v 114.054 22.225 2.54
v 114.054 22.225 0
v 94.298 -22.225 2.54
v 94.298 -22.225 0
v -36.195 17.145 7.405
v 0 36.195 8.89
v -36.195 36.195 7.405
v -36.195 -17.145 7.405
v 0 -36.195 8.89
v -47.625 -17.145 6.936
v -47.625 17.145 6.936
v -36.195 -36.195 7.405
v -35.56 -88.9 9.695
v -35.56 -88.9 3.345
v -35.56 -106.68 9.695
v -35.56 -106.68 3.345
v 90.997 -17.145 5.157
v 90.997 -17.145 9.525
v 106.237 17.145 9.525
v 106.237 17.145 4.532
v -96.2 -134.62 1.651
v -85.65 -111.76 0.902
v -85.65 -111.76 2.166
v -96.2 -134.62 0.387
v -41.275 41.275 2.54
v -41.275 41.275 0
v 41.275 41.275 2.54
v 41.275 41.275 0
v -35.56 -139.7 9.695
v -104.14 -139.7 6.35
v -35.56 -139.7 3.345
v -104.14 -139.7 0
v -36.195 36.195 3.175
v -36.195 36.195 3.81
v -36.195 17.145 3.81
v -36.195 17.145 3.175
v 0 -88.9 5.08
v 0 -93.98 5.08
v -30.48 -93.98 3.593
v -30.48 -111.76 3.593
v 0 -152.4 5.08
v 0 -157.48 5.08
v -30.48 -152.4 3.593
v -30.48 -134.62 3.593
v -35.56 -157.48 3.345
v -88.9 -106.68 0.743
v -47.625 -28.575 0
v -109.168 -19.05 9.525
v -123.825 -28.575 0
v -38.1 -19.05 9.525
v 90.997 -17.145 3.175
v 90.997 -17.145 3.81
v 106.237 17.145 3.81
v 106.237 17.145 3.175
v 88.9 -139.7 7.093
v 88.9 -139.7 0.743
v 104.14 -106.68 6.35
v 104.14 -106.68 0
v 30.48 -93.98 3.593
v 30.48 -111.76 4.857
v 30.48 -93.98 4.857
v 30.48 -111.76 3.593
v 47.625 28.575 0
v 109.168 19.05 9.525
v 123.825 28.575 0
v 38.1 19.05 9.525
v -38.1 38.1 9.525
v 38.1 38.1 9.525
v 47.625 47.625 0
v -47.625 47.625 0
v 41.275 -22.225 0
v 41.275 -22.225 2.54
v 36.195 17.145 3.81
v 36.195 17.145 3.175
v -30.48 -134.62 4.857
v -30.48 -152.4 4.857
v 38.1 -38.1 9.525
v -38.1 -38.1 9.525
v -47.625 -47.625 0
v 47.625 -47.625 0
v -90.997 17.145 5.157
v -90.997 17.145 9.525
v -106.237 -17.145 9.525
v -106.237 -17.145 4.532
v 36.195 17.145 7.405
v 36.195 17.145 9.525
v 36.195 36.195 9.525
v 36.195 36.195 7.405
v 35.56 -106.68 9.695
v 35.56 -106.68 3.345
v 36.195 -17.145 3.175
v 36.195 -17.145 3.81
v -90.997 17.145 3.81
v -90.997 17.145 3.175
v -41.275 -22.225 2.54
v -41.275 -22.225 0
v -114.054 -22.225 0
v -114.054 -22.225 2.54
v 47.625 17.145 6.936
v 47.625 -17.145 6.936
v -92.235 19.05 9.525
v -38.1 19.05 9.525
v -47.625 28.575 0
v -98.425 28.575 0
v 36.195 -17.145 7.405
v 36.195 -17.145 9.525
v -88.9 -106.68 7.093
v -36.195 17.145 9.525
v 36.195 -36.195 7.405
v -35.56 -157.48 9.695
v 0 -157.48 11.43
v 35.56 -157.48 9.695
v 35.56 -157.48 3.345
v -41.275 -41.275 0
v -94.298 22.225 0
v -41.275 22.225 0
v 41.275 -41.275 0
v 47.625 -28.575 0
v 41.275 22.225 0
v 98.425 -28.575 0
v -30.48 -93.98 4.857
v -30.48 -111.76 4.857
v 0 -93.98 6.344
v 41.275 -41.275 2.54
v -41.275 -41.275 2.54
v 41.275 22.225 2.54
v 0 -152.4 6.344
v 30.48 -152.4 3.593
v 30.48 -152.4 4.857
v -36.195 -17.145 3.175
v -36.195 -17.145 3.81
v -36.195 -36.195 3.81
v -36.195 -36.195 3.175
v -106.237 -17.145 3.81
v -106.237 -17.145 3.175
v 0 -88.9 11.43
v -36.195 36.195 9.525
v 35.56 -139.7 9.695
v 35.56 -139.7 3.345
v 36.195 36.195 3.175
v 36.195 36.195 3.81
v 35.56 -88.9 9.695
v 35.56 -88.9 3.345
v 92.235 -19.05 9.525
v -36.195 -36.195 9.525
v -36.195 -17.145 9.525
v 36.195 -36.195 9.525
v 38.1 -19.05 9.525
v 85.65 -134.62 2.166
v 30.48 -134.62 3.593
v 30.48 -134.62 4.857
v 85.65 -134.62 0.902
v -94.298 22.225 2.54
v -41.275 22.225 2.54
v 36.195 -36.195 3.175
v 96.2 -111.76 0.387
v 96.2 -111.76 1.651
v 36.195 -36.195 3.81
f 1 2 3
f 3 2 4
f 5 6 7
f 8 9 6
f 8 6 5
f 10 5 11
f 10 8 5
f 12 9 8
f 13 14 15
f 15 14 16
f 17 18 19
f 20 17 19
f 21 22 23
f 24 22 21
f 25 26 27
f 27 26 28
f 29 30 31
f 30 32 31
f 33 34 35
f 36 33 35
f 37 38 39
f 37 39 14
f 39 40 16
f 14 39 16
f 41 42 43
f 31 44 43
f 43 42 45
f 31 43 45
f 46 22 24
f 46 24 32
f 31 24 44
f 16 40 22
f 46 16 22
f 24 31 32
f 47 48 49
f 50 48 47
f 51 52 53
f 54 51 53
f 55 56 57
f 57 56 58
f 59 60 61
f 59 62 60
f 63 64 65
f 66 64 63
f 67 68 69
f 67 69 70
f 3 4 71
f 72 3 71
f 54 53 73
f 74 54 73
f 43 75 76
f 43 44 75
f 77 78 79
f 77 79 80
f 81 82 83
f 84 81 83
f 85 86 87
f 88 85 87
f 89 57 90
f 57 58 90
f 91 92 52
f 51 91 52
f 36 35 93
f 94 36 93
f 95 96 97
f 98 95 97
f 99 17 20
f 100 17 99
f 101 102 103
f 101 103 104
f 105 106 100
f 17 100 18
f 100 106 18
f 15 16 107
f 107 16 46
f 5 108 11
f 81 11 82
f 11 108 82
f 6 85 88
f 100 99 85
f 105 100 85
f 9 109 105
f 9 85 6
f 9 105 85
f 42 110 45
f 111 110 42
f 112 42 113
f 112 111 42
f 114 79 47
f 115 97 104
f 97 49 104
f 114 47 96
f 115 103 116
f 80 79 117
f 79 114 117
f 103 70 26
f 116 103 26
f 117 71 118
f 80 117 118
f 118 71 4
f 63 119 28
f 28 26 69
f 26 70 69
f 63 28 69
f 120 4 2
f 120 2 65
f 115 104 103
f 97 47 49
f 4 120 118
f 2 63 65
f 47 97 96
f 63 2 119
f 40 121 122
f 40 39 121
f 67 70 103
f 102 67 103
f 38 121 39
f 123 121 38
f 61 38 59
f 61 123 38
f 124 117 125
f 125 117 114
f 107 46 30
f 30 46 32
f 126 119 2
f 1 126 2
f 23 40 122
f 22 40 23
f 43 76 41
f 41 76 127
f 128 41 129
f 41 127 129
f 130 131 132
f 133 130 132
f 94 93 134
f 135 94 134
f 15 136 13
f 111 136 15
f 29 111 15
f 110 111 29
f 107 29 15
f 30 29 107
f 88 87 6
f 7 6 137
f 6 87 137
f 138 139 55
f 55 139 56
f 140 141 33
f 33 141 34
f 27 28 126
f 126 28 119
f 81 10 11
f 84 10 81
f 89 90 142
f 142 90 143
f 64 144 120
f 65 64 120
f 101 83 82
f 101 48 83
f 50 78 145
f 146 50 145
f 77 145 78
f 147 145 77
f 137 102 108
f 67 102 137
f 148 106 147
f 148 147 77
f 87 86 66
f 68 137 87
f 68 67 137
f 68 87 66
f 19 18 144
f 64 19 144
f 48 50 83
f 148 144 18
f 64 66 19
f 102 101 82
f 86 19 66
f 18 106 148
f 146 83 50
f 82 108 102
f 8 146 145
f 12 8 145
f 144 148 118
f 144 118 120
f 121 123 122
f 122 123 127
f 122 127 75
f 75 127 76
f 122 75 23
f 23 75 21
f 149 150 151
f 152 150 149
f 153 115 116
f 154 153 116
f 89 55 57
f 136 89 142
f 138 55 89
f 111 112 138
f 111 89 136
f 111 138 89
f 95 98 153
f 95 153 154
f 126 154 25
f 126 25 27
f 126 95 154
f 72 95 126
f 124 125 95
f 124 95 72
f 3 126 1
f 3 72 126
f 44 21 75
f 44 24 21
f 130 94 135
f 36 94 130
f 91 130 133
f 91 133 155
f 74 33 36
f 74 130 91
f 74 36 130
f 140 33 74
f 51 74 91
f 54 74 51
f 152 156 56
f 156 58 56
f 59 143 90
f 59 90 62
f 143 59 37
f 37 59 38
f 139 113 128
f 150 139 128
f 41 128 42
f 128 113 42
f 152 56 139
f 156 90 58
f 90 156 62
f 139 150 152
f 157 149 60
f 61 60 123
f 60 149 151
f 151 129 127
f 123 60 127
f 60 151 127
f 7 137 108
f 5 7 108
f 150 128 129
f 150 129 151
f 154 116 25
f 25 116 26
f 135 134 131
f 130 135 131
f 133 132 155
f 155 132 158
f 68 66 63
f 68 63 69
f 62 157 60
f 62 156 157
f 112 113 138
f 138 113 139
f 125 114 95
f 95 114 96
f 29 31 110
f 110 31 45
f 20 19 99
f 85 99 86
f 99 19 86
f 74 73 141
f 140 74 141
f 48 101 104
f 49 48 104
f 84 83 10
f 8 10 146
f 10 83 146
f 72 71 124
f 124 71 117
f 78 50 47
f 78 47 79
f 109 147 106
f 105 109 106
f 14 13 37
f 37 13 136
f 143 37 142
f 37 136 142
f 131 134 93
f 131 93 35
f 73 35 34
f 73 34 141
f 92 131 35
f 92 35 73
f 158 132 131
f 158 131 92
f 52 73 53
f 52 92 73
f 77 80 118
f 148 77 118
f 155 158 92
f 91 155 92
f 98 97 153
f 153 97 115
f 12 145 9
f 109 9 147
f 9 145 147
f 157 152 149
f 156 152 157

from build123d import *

# Parameters (mm, degrees)
F1_DEPTH  = 9.525
F3_DEPTH  = 6.35
F5_DEPTH  = 83.82
F6_DEPTH  = 3.1271538462
F7_SIZE   = 9.52499
F9_DEPTH  = 6.35
F11_DEPTH = 68.58
F12_DEPTH = 3.3463658537
F14_DEPTH = 68.58
F15_T     = -5.08
F17_DEPTH = 2.54


# Not quite as in the source:
# - a fillet or chamfer is up to 0.001 mm smaller than in the source, because OpenCascade refuses the exact size
# - a length typed as a fraction of an inch, garbled in the dataset ("3 / 203.2 mm" for 3/8 in), is restored


with BuildPart() as f1:
    # F0 (on Top) → F1 (new body)
    with BuildSketch(Plane.XY):
        Polygon((-47.625, 28.575), (-98.425, 28.575), (-123.825, -28.575), (-47.625, -28.575), (-47.625, -47.625), (47.625, -47.625), (47.625, -28.575), (98.425, -28.575), (123.825, 28.575), (47.625, 28.575), (47.625, 47.625), (-47.625, 47.625), align=None)
    extrude(amount=F1_DEPTH)

    # F2 (on face) → F3 (cut)
    with BuildSketch(Plane.XY.offset(9.525)):
        Polygon((-36.195, 36.195), (-36.195, 17.145), (-90.9969505917, 17.145), (-106.2369505917, -17.145), (-36.195, -17.145), (-36.195, -36.195), (36.195, -36.195), (36.195, -17.145), (90.9969505917, -17.145), (106.2369505917, 17.145), (36.195, 17.145), (36.195, 36.195), align=None)
    extrude(amount=-F3_DEPTH, mode=Mode.SUBTRACT)

    # F4 (on face) → F5 (join, through all)
    with BuildSketch(Plane.XZ.offset(47.625)):
        Polygon((-47.625, 6.9361538462), (-47.625, 3.81), (47.625, 3.81), (47.625, 6.9361538462), (0, 8.89), align=None)
        Polygon((-47.625, 6.9361538462), (-123.825, 3.81), (-47.625, 3.81), align=None)
        Polygon((47.625, 6.9361538462), (47.625, 3.81), (123.825, 3.81), align=None)
    extrude(amount=-F5_DEPTH)

    # F6 (cut, through all): faces of the model
    f6_faces = [f1.faces().sort_by_distance(p)[0] for p in [
        (-85.725, -38.1, 3.81),
        (85.725, -46.5473692655, 3.81),
        (85.725, 32.385, 3.81),
        (-112.0388843262, 0.4061708117, 3.81),
    ]]
    extrude(f6_faces, amount=-F6_DEPTH, mode=Mode.SUBTRACT)

    # F7 (size 9.525 in the source; OpenCascade refuses exactly that, so slightly less here)
    f7_edges = [f1.edges().sort_by_distance(p)[0] for p in [
        (-111.125, 0, 9.525),
        (-73.025, 28.575, 9.525),
        (0, 47.625, 9.525),
        (-47.625, 38.1, 9.525),
        (47.625, 38.1, 9.525),
        (85.725, 28.575, 9.525),
        (111.125, 0, 9.525),
        (73.025, -28.575, 9.525),
        (47.625, -38.1, 9.525),
        (0, -47.625, 9.525),
        (-47.625, -38.1, 9.525),
        (-85.725, -28.575, 9.525),
    ]]
    chamfer(f7_edges, length=F7_SIZE)

    # F16 (on face) → F17 (cut)
    with BuildSketch(Plane(origin=(0, 0, 0), x_dir=(1, 0, 0), z_dir=(0, 0, -1))):
        Polygon((-41.275, 41.275), (-41.275, 22.225), (-114.0538614398, 22.225), (-94.2983058843, -22.225), (-41.275, -22.225), (-41.275, -41.275), (41.275, -41.275), (41.275, -22.225), (114.0538614398, -22.225), (94.2983058843, 22.225), (41.275, 22.225), (41.275, 41.275), align=None)
    extrude(amount=-F17_DEPTH, mode=Mode.SUBTRACT)


with BuildPart() as f9:
    # F8 (on Top) → F9 (new body)
    with BuildSketch(Plane.XY):
        Polygon((-35.56, -106.68), (-88.9, -106.68), (-104.14, -139.7), (-35.56, -139.7), (-35.56, -157.48), (35.56, -157.48), (35.56, -139.7), (88.9, -139.7), (104.14, -106.68), (35.56, -106.68), (35.56, -88.9), (-35.56, -88.9), align=None)
    extrude(amount=F9_DEPTH)

    # F10 (on face) → F11 (join, through all)
    with BuildSketch(Plane.XZ.offset(157.48)):
        Polygon((0, 11.43), (-104.14, 6.35), (104.14, 6.35), align=None)
    extrude(amount=-F11_DEPTH)

    # F12 (cut, through all): faces of the model
    f12_faces = [f9.faces().sort_by_distance(p)[0] for p in [
        (-69.85, -148.59, 6.35),
        (-74.8464473684, -101.193377193, 6.35),
        (74.8464473684, -145.186622807, 6.35),
        (69.85, -97.79, 6.35),
    ]]
    extrude(f12_faces, amount=-F12_DEPTH, mode=Mode.SUBTRACT)

    # F13 (on face) → F14 (cut, through all)
    with BuildSketch(Plane.XZ.offset(157.48)):
        Polygon((0, 5.08), (-104.14, 0), (104.14, 0), align=None)
    extrude(amount=-F14_DEPTH, mode=Mode.SUBTRACT)

    # F15
    f15_openings = [f9.faces().sort_by_distance(p)[0] for p in [
        (-39.673696, -123.501058, 3.144698),
        (39.673696, -122.878942, 3.144698),
    ]]
    offset(amount=F15_T, openings=f15_openings, kind=Kind.INTERSECTION)


solid = Compound([f1.part, f9.part])
